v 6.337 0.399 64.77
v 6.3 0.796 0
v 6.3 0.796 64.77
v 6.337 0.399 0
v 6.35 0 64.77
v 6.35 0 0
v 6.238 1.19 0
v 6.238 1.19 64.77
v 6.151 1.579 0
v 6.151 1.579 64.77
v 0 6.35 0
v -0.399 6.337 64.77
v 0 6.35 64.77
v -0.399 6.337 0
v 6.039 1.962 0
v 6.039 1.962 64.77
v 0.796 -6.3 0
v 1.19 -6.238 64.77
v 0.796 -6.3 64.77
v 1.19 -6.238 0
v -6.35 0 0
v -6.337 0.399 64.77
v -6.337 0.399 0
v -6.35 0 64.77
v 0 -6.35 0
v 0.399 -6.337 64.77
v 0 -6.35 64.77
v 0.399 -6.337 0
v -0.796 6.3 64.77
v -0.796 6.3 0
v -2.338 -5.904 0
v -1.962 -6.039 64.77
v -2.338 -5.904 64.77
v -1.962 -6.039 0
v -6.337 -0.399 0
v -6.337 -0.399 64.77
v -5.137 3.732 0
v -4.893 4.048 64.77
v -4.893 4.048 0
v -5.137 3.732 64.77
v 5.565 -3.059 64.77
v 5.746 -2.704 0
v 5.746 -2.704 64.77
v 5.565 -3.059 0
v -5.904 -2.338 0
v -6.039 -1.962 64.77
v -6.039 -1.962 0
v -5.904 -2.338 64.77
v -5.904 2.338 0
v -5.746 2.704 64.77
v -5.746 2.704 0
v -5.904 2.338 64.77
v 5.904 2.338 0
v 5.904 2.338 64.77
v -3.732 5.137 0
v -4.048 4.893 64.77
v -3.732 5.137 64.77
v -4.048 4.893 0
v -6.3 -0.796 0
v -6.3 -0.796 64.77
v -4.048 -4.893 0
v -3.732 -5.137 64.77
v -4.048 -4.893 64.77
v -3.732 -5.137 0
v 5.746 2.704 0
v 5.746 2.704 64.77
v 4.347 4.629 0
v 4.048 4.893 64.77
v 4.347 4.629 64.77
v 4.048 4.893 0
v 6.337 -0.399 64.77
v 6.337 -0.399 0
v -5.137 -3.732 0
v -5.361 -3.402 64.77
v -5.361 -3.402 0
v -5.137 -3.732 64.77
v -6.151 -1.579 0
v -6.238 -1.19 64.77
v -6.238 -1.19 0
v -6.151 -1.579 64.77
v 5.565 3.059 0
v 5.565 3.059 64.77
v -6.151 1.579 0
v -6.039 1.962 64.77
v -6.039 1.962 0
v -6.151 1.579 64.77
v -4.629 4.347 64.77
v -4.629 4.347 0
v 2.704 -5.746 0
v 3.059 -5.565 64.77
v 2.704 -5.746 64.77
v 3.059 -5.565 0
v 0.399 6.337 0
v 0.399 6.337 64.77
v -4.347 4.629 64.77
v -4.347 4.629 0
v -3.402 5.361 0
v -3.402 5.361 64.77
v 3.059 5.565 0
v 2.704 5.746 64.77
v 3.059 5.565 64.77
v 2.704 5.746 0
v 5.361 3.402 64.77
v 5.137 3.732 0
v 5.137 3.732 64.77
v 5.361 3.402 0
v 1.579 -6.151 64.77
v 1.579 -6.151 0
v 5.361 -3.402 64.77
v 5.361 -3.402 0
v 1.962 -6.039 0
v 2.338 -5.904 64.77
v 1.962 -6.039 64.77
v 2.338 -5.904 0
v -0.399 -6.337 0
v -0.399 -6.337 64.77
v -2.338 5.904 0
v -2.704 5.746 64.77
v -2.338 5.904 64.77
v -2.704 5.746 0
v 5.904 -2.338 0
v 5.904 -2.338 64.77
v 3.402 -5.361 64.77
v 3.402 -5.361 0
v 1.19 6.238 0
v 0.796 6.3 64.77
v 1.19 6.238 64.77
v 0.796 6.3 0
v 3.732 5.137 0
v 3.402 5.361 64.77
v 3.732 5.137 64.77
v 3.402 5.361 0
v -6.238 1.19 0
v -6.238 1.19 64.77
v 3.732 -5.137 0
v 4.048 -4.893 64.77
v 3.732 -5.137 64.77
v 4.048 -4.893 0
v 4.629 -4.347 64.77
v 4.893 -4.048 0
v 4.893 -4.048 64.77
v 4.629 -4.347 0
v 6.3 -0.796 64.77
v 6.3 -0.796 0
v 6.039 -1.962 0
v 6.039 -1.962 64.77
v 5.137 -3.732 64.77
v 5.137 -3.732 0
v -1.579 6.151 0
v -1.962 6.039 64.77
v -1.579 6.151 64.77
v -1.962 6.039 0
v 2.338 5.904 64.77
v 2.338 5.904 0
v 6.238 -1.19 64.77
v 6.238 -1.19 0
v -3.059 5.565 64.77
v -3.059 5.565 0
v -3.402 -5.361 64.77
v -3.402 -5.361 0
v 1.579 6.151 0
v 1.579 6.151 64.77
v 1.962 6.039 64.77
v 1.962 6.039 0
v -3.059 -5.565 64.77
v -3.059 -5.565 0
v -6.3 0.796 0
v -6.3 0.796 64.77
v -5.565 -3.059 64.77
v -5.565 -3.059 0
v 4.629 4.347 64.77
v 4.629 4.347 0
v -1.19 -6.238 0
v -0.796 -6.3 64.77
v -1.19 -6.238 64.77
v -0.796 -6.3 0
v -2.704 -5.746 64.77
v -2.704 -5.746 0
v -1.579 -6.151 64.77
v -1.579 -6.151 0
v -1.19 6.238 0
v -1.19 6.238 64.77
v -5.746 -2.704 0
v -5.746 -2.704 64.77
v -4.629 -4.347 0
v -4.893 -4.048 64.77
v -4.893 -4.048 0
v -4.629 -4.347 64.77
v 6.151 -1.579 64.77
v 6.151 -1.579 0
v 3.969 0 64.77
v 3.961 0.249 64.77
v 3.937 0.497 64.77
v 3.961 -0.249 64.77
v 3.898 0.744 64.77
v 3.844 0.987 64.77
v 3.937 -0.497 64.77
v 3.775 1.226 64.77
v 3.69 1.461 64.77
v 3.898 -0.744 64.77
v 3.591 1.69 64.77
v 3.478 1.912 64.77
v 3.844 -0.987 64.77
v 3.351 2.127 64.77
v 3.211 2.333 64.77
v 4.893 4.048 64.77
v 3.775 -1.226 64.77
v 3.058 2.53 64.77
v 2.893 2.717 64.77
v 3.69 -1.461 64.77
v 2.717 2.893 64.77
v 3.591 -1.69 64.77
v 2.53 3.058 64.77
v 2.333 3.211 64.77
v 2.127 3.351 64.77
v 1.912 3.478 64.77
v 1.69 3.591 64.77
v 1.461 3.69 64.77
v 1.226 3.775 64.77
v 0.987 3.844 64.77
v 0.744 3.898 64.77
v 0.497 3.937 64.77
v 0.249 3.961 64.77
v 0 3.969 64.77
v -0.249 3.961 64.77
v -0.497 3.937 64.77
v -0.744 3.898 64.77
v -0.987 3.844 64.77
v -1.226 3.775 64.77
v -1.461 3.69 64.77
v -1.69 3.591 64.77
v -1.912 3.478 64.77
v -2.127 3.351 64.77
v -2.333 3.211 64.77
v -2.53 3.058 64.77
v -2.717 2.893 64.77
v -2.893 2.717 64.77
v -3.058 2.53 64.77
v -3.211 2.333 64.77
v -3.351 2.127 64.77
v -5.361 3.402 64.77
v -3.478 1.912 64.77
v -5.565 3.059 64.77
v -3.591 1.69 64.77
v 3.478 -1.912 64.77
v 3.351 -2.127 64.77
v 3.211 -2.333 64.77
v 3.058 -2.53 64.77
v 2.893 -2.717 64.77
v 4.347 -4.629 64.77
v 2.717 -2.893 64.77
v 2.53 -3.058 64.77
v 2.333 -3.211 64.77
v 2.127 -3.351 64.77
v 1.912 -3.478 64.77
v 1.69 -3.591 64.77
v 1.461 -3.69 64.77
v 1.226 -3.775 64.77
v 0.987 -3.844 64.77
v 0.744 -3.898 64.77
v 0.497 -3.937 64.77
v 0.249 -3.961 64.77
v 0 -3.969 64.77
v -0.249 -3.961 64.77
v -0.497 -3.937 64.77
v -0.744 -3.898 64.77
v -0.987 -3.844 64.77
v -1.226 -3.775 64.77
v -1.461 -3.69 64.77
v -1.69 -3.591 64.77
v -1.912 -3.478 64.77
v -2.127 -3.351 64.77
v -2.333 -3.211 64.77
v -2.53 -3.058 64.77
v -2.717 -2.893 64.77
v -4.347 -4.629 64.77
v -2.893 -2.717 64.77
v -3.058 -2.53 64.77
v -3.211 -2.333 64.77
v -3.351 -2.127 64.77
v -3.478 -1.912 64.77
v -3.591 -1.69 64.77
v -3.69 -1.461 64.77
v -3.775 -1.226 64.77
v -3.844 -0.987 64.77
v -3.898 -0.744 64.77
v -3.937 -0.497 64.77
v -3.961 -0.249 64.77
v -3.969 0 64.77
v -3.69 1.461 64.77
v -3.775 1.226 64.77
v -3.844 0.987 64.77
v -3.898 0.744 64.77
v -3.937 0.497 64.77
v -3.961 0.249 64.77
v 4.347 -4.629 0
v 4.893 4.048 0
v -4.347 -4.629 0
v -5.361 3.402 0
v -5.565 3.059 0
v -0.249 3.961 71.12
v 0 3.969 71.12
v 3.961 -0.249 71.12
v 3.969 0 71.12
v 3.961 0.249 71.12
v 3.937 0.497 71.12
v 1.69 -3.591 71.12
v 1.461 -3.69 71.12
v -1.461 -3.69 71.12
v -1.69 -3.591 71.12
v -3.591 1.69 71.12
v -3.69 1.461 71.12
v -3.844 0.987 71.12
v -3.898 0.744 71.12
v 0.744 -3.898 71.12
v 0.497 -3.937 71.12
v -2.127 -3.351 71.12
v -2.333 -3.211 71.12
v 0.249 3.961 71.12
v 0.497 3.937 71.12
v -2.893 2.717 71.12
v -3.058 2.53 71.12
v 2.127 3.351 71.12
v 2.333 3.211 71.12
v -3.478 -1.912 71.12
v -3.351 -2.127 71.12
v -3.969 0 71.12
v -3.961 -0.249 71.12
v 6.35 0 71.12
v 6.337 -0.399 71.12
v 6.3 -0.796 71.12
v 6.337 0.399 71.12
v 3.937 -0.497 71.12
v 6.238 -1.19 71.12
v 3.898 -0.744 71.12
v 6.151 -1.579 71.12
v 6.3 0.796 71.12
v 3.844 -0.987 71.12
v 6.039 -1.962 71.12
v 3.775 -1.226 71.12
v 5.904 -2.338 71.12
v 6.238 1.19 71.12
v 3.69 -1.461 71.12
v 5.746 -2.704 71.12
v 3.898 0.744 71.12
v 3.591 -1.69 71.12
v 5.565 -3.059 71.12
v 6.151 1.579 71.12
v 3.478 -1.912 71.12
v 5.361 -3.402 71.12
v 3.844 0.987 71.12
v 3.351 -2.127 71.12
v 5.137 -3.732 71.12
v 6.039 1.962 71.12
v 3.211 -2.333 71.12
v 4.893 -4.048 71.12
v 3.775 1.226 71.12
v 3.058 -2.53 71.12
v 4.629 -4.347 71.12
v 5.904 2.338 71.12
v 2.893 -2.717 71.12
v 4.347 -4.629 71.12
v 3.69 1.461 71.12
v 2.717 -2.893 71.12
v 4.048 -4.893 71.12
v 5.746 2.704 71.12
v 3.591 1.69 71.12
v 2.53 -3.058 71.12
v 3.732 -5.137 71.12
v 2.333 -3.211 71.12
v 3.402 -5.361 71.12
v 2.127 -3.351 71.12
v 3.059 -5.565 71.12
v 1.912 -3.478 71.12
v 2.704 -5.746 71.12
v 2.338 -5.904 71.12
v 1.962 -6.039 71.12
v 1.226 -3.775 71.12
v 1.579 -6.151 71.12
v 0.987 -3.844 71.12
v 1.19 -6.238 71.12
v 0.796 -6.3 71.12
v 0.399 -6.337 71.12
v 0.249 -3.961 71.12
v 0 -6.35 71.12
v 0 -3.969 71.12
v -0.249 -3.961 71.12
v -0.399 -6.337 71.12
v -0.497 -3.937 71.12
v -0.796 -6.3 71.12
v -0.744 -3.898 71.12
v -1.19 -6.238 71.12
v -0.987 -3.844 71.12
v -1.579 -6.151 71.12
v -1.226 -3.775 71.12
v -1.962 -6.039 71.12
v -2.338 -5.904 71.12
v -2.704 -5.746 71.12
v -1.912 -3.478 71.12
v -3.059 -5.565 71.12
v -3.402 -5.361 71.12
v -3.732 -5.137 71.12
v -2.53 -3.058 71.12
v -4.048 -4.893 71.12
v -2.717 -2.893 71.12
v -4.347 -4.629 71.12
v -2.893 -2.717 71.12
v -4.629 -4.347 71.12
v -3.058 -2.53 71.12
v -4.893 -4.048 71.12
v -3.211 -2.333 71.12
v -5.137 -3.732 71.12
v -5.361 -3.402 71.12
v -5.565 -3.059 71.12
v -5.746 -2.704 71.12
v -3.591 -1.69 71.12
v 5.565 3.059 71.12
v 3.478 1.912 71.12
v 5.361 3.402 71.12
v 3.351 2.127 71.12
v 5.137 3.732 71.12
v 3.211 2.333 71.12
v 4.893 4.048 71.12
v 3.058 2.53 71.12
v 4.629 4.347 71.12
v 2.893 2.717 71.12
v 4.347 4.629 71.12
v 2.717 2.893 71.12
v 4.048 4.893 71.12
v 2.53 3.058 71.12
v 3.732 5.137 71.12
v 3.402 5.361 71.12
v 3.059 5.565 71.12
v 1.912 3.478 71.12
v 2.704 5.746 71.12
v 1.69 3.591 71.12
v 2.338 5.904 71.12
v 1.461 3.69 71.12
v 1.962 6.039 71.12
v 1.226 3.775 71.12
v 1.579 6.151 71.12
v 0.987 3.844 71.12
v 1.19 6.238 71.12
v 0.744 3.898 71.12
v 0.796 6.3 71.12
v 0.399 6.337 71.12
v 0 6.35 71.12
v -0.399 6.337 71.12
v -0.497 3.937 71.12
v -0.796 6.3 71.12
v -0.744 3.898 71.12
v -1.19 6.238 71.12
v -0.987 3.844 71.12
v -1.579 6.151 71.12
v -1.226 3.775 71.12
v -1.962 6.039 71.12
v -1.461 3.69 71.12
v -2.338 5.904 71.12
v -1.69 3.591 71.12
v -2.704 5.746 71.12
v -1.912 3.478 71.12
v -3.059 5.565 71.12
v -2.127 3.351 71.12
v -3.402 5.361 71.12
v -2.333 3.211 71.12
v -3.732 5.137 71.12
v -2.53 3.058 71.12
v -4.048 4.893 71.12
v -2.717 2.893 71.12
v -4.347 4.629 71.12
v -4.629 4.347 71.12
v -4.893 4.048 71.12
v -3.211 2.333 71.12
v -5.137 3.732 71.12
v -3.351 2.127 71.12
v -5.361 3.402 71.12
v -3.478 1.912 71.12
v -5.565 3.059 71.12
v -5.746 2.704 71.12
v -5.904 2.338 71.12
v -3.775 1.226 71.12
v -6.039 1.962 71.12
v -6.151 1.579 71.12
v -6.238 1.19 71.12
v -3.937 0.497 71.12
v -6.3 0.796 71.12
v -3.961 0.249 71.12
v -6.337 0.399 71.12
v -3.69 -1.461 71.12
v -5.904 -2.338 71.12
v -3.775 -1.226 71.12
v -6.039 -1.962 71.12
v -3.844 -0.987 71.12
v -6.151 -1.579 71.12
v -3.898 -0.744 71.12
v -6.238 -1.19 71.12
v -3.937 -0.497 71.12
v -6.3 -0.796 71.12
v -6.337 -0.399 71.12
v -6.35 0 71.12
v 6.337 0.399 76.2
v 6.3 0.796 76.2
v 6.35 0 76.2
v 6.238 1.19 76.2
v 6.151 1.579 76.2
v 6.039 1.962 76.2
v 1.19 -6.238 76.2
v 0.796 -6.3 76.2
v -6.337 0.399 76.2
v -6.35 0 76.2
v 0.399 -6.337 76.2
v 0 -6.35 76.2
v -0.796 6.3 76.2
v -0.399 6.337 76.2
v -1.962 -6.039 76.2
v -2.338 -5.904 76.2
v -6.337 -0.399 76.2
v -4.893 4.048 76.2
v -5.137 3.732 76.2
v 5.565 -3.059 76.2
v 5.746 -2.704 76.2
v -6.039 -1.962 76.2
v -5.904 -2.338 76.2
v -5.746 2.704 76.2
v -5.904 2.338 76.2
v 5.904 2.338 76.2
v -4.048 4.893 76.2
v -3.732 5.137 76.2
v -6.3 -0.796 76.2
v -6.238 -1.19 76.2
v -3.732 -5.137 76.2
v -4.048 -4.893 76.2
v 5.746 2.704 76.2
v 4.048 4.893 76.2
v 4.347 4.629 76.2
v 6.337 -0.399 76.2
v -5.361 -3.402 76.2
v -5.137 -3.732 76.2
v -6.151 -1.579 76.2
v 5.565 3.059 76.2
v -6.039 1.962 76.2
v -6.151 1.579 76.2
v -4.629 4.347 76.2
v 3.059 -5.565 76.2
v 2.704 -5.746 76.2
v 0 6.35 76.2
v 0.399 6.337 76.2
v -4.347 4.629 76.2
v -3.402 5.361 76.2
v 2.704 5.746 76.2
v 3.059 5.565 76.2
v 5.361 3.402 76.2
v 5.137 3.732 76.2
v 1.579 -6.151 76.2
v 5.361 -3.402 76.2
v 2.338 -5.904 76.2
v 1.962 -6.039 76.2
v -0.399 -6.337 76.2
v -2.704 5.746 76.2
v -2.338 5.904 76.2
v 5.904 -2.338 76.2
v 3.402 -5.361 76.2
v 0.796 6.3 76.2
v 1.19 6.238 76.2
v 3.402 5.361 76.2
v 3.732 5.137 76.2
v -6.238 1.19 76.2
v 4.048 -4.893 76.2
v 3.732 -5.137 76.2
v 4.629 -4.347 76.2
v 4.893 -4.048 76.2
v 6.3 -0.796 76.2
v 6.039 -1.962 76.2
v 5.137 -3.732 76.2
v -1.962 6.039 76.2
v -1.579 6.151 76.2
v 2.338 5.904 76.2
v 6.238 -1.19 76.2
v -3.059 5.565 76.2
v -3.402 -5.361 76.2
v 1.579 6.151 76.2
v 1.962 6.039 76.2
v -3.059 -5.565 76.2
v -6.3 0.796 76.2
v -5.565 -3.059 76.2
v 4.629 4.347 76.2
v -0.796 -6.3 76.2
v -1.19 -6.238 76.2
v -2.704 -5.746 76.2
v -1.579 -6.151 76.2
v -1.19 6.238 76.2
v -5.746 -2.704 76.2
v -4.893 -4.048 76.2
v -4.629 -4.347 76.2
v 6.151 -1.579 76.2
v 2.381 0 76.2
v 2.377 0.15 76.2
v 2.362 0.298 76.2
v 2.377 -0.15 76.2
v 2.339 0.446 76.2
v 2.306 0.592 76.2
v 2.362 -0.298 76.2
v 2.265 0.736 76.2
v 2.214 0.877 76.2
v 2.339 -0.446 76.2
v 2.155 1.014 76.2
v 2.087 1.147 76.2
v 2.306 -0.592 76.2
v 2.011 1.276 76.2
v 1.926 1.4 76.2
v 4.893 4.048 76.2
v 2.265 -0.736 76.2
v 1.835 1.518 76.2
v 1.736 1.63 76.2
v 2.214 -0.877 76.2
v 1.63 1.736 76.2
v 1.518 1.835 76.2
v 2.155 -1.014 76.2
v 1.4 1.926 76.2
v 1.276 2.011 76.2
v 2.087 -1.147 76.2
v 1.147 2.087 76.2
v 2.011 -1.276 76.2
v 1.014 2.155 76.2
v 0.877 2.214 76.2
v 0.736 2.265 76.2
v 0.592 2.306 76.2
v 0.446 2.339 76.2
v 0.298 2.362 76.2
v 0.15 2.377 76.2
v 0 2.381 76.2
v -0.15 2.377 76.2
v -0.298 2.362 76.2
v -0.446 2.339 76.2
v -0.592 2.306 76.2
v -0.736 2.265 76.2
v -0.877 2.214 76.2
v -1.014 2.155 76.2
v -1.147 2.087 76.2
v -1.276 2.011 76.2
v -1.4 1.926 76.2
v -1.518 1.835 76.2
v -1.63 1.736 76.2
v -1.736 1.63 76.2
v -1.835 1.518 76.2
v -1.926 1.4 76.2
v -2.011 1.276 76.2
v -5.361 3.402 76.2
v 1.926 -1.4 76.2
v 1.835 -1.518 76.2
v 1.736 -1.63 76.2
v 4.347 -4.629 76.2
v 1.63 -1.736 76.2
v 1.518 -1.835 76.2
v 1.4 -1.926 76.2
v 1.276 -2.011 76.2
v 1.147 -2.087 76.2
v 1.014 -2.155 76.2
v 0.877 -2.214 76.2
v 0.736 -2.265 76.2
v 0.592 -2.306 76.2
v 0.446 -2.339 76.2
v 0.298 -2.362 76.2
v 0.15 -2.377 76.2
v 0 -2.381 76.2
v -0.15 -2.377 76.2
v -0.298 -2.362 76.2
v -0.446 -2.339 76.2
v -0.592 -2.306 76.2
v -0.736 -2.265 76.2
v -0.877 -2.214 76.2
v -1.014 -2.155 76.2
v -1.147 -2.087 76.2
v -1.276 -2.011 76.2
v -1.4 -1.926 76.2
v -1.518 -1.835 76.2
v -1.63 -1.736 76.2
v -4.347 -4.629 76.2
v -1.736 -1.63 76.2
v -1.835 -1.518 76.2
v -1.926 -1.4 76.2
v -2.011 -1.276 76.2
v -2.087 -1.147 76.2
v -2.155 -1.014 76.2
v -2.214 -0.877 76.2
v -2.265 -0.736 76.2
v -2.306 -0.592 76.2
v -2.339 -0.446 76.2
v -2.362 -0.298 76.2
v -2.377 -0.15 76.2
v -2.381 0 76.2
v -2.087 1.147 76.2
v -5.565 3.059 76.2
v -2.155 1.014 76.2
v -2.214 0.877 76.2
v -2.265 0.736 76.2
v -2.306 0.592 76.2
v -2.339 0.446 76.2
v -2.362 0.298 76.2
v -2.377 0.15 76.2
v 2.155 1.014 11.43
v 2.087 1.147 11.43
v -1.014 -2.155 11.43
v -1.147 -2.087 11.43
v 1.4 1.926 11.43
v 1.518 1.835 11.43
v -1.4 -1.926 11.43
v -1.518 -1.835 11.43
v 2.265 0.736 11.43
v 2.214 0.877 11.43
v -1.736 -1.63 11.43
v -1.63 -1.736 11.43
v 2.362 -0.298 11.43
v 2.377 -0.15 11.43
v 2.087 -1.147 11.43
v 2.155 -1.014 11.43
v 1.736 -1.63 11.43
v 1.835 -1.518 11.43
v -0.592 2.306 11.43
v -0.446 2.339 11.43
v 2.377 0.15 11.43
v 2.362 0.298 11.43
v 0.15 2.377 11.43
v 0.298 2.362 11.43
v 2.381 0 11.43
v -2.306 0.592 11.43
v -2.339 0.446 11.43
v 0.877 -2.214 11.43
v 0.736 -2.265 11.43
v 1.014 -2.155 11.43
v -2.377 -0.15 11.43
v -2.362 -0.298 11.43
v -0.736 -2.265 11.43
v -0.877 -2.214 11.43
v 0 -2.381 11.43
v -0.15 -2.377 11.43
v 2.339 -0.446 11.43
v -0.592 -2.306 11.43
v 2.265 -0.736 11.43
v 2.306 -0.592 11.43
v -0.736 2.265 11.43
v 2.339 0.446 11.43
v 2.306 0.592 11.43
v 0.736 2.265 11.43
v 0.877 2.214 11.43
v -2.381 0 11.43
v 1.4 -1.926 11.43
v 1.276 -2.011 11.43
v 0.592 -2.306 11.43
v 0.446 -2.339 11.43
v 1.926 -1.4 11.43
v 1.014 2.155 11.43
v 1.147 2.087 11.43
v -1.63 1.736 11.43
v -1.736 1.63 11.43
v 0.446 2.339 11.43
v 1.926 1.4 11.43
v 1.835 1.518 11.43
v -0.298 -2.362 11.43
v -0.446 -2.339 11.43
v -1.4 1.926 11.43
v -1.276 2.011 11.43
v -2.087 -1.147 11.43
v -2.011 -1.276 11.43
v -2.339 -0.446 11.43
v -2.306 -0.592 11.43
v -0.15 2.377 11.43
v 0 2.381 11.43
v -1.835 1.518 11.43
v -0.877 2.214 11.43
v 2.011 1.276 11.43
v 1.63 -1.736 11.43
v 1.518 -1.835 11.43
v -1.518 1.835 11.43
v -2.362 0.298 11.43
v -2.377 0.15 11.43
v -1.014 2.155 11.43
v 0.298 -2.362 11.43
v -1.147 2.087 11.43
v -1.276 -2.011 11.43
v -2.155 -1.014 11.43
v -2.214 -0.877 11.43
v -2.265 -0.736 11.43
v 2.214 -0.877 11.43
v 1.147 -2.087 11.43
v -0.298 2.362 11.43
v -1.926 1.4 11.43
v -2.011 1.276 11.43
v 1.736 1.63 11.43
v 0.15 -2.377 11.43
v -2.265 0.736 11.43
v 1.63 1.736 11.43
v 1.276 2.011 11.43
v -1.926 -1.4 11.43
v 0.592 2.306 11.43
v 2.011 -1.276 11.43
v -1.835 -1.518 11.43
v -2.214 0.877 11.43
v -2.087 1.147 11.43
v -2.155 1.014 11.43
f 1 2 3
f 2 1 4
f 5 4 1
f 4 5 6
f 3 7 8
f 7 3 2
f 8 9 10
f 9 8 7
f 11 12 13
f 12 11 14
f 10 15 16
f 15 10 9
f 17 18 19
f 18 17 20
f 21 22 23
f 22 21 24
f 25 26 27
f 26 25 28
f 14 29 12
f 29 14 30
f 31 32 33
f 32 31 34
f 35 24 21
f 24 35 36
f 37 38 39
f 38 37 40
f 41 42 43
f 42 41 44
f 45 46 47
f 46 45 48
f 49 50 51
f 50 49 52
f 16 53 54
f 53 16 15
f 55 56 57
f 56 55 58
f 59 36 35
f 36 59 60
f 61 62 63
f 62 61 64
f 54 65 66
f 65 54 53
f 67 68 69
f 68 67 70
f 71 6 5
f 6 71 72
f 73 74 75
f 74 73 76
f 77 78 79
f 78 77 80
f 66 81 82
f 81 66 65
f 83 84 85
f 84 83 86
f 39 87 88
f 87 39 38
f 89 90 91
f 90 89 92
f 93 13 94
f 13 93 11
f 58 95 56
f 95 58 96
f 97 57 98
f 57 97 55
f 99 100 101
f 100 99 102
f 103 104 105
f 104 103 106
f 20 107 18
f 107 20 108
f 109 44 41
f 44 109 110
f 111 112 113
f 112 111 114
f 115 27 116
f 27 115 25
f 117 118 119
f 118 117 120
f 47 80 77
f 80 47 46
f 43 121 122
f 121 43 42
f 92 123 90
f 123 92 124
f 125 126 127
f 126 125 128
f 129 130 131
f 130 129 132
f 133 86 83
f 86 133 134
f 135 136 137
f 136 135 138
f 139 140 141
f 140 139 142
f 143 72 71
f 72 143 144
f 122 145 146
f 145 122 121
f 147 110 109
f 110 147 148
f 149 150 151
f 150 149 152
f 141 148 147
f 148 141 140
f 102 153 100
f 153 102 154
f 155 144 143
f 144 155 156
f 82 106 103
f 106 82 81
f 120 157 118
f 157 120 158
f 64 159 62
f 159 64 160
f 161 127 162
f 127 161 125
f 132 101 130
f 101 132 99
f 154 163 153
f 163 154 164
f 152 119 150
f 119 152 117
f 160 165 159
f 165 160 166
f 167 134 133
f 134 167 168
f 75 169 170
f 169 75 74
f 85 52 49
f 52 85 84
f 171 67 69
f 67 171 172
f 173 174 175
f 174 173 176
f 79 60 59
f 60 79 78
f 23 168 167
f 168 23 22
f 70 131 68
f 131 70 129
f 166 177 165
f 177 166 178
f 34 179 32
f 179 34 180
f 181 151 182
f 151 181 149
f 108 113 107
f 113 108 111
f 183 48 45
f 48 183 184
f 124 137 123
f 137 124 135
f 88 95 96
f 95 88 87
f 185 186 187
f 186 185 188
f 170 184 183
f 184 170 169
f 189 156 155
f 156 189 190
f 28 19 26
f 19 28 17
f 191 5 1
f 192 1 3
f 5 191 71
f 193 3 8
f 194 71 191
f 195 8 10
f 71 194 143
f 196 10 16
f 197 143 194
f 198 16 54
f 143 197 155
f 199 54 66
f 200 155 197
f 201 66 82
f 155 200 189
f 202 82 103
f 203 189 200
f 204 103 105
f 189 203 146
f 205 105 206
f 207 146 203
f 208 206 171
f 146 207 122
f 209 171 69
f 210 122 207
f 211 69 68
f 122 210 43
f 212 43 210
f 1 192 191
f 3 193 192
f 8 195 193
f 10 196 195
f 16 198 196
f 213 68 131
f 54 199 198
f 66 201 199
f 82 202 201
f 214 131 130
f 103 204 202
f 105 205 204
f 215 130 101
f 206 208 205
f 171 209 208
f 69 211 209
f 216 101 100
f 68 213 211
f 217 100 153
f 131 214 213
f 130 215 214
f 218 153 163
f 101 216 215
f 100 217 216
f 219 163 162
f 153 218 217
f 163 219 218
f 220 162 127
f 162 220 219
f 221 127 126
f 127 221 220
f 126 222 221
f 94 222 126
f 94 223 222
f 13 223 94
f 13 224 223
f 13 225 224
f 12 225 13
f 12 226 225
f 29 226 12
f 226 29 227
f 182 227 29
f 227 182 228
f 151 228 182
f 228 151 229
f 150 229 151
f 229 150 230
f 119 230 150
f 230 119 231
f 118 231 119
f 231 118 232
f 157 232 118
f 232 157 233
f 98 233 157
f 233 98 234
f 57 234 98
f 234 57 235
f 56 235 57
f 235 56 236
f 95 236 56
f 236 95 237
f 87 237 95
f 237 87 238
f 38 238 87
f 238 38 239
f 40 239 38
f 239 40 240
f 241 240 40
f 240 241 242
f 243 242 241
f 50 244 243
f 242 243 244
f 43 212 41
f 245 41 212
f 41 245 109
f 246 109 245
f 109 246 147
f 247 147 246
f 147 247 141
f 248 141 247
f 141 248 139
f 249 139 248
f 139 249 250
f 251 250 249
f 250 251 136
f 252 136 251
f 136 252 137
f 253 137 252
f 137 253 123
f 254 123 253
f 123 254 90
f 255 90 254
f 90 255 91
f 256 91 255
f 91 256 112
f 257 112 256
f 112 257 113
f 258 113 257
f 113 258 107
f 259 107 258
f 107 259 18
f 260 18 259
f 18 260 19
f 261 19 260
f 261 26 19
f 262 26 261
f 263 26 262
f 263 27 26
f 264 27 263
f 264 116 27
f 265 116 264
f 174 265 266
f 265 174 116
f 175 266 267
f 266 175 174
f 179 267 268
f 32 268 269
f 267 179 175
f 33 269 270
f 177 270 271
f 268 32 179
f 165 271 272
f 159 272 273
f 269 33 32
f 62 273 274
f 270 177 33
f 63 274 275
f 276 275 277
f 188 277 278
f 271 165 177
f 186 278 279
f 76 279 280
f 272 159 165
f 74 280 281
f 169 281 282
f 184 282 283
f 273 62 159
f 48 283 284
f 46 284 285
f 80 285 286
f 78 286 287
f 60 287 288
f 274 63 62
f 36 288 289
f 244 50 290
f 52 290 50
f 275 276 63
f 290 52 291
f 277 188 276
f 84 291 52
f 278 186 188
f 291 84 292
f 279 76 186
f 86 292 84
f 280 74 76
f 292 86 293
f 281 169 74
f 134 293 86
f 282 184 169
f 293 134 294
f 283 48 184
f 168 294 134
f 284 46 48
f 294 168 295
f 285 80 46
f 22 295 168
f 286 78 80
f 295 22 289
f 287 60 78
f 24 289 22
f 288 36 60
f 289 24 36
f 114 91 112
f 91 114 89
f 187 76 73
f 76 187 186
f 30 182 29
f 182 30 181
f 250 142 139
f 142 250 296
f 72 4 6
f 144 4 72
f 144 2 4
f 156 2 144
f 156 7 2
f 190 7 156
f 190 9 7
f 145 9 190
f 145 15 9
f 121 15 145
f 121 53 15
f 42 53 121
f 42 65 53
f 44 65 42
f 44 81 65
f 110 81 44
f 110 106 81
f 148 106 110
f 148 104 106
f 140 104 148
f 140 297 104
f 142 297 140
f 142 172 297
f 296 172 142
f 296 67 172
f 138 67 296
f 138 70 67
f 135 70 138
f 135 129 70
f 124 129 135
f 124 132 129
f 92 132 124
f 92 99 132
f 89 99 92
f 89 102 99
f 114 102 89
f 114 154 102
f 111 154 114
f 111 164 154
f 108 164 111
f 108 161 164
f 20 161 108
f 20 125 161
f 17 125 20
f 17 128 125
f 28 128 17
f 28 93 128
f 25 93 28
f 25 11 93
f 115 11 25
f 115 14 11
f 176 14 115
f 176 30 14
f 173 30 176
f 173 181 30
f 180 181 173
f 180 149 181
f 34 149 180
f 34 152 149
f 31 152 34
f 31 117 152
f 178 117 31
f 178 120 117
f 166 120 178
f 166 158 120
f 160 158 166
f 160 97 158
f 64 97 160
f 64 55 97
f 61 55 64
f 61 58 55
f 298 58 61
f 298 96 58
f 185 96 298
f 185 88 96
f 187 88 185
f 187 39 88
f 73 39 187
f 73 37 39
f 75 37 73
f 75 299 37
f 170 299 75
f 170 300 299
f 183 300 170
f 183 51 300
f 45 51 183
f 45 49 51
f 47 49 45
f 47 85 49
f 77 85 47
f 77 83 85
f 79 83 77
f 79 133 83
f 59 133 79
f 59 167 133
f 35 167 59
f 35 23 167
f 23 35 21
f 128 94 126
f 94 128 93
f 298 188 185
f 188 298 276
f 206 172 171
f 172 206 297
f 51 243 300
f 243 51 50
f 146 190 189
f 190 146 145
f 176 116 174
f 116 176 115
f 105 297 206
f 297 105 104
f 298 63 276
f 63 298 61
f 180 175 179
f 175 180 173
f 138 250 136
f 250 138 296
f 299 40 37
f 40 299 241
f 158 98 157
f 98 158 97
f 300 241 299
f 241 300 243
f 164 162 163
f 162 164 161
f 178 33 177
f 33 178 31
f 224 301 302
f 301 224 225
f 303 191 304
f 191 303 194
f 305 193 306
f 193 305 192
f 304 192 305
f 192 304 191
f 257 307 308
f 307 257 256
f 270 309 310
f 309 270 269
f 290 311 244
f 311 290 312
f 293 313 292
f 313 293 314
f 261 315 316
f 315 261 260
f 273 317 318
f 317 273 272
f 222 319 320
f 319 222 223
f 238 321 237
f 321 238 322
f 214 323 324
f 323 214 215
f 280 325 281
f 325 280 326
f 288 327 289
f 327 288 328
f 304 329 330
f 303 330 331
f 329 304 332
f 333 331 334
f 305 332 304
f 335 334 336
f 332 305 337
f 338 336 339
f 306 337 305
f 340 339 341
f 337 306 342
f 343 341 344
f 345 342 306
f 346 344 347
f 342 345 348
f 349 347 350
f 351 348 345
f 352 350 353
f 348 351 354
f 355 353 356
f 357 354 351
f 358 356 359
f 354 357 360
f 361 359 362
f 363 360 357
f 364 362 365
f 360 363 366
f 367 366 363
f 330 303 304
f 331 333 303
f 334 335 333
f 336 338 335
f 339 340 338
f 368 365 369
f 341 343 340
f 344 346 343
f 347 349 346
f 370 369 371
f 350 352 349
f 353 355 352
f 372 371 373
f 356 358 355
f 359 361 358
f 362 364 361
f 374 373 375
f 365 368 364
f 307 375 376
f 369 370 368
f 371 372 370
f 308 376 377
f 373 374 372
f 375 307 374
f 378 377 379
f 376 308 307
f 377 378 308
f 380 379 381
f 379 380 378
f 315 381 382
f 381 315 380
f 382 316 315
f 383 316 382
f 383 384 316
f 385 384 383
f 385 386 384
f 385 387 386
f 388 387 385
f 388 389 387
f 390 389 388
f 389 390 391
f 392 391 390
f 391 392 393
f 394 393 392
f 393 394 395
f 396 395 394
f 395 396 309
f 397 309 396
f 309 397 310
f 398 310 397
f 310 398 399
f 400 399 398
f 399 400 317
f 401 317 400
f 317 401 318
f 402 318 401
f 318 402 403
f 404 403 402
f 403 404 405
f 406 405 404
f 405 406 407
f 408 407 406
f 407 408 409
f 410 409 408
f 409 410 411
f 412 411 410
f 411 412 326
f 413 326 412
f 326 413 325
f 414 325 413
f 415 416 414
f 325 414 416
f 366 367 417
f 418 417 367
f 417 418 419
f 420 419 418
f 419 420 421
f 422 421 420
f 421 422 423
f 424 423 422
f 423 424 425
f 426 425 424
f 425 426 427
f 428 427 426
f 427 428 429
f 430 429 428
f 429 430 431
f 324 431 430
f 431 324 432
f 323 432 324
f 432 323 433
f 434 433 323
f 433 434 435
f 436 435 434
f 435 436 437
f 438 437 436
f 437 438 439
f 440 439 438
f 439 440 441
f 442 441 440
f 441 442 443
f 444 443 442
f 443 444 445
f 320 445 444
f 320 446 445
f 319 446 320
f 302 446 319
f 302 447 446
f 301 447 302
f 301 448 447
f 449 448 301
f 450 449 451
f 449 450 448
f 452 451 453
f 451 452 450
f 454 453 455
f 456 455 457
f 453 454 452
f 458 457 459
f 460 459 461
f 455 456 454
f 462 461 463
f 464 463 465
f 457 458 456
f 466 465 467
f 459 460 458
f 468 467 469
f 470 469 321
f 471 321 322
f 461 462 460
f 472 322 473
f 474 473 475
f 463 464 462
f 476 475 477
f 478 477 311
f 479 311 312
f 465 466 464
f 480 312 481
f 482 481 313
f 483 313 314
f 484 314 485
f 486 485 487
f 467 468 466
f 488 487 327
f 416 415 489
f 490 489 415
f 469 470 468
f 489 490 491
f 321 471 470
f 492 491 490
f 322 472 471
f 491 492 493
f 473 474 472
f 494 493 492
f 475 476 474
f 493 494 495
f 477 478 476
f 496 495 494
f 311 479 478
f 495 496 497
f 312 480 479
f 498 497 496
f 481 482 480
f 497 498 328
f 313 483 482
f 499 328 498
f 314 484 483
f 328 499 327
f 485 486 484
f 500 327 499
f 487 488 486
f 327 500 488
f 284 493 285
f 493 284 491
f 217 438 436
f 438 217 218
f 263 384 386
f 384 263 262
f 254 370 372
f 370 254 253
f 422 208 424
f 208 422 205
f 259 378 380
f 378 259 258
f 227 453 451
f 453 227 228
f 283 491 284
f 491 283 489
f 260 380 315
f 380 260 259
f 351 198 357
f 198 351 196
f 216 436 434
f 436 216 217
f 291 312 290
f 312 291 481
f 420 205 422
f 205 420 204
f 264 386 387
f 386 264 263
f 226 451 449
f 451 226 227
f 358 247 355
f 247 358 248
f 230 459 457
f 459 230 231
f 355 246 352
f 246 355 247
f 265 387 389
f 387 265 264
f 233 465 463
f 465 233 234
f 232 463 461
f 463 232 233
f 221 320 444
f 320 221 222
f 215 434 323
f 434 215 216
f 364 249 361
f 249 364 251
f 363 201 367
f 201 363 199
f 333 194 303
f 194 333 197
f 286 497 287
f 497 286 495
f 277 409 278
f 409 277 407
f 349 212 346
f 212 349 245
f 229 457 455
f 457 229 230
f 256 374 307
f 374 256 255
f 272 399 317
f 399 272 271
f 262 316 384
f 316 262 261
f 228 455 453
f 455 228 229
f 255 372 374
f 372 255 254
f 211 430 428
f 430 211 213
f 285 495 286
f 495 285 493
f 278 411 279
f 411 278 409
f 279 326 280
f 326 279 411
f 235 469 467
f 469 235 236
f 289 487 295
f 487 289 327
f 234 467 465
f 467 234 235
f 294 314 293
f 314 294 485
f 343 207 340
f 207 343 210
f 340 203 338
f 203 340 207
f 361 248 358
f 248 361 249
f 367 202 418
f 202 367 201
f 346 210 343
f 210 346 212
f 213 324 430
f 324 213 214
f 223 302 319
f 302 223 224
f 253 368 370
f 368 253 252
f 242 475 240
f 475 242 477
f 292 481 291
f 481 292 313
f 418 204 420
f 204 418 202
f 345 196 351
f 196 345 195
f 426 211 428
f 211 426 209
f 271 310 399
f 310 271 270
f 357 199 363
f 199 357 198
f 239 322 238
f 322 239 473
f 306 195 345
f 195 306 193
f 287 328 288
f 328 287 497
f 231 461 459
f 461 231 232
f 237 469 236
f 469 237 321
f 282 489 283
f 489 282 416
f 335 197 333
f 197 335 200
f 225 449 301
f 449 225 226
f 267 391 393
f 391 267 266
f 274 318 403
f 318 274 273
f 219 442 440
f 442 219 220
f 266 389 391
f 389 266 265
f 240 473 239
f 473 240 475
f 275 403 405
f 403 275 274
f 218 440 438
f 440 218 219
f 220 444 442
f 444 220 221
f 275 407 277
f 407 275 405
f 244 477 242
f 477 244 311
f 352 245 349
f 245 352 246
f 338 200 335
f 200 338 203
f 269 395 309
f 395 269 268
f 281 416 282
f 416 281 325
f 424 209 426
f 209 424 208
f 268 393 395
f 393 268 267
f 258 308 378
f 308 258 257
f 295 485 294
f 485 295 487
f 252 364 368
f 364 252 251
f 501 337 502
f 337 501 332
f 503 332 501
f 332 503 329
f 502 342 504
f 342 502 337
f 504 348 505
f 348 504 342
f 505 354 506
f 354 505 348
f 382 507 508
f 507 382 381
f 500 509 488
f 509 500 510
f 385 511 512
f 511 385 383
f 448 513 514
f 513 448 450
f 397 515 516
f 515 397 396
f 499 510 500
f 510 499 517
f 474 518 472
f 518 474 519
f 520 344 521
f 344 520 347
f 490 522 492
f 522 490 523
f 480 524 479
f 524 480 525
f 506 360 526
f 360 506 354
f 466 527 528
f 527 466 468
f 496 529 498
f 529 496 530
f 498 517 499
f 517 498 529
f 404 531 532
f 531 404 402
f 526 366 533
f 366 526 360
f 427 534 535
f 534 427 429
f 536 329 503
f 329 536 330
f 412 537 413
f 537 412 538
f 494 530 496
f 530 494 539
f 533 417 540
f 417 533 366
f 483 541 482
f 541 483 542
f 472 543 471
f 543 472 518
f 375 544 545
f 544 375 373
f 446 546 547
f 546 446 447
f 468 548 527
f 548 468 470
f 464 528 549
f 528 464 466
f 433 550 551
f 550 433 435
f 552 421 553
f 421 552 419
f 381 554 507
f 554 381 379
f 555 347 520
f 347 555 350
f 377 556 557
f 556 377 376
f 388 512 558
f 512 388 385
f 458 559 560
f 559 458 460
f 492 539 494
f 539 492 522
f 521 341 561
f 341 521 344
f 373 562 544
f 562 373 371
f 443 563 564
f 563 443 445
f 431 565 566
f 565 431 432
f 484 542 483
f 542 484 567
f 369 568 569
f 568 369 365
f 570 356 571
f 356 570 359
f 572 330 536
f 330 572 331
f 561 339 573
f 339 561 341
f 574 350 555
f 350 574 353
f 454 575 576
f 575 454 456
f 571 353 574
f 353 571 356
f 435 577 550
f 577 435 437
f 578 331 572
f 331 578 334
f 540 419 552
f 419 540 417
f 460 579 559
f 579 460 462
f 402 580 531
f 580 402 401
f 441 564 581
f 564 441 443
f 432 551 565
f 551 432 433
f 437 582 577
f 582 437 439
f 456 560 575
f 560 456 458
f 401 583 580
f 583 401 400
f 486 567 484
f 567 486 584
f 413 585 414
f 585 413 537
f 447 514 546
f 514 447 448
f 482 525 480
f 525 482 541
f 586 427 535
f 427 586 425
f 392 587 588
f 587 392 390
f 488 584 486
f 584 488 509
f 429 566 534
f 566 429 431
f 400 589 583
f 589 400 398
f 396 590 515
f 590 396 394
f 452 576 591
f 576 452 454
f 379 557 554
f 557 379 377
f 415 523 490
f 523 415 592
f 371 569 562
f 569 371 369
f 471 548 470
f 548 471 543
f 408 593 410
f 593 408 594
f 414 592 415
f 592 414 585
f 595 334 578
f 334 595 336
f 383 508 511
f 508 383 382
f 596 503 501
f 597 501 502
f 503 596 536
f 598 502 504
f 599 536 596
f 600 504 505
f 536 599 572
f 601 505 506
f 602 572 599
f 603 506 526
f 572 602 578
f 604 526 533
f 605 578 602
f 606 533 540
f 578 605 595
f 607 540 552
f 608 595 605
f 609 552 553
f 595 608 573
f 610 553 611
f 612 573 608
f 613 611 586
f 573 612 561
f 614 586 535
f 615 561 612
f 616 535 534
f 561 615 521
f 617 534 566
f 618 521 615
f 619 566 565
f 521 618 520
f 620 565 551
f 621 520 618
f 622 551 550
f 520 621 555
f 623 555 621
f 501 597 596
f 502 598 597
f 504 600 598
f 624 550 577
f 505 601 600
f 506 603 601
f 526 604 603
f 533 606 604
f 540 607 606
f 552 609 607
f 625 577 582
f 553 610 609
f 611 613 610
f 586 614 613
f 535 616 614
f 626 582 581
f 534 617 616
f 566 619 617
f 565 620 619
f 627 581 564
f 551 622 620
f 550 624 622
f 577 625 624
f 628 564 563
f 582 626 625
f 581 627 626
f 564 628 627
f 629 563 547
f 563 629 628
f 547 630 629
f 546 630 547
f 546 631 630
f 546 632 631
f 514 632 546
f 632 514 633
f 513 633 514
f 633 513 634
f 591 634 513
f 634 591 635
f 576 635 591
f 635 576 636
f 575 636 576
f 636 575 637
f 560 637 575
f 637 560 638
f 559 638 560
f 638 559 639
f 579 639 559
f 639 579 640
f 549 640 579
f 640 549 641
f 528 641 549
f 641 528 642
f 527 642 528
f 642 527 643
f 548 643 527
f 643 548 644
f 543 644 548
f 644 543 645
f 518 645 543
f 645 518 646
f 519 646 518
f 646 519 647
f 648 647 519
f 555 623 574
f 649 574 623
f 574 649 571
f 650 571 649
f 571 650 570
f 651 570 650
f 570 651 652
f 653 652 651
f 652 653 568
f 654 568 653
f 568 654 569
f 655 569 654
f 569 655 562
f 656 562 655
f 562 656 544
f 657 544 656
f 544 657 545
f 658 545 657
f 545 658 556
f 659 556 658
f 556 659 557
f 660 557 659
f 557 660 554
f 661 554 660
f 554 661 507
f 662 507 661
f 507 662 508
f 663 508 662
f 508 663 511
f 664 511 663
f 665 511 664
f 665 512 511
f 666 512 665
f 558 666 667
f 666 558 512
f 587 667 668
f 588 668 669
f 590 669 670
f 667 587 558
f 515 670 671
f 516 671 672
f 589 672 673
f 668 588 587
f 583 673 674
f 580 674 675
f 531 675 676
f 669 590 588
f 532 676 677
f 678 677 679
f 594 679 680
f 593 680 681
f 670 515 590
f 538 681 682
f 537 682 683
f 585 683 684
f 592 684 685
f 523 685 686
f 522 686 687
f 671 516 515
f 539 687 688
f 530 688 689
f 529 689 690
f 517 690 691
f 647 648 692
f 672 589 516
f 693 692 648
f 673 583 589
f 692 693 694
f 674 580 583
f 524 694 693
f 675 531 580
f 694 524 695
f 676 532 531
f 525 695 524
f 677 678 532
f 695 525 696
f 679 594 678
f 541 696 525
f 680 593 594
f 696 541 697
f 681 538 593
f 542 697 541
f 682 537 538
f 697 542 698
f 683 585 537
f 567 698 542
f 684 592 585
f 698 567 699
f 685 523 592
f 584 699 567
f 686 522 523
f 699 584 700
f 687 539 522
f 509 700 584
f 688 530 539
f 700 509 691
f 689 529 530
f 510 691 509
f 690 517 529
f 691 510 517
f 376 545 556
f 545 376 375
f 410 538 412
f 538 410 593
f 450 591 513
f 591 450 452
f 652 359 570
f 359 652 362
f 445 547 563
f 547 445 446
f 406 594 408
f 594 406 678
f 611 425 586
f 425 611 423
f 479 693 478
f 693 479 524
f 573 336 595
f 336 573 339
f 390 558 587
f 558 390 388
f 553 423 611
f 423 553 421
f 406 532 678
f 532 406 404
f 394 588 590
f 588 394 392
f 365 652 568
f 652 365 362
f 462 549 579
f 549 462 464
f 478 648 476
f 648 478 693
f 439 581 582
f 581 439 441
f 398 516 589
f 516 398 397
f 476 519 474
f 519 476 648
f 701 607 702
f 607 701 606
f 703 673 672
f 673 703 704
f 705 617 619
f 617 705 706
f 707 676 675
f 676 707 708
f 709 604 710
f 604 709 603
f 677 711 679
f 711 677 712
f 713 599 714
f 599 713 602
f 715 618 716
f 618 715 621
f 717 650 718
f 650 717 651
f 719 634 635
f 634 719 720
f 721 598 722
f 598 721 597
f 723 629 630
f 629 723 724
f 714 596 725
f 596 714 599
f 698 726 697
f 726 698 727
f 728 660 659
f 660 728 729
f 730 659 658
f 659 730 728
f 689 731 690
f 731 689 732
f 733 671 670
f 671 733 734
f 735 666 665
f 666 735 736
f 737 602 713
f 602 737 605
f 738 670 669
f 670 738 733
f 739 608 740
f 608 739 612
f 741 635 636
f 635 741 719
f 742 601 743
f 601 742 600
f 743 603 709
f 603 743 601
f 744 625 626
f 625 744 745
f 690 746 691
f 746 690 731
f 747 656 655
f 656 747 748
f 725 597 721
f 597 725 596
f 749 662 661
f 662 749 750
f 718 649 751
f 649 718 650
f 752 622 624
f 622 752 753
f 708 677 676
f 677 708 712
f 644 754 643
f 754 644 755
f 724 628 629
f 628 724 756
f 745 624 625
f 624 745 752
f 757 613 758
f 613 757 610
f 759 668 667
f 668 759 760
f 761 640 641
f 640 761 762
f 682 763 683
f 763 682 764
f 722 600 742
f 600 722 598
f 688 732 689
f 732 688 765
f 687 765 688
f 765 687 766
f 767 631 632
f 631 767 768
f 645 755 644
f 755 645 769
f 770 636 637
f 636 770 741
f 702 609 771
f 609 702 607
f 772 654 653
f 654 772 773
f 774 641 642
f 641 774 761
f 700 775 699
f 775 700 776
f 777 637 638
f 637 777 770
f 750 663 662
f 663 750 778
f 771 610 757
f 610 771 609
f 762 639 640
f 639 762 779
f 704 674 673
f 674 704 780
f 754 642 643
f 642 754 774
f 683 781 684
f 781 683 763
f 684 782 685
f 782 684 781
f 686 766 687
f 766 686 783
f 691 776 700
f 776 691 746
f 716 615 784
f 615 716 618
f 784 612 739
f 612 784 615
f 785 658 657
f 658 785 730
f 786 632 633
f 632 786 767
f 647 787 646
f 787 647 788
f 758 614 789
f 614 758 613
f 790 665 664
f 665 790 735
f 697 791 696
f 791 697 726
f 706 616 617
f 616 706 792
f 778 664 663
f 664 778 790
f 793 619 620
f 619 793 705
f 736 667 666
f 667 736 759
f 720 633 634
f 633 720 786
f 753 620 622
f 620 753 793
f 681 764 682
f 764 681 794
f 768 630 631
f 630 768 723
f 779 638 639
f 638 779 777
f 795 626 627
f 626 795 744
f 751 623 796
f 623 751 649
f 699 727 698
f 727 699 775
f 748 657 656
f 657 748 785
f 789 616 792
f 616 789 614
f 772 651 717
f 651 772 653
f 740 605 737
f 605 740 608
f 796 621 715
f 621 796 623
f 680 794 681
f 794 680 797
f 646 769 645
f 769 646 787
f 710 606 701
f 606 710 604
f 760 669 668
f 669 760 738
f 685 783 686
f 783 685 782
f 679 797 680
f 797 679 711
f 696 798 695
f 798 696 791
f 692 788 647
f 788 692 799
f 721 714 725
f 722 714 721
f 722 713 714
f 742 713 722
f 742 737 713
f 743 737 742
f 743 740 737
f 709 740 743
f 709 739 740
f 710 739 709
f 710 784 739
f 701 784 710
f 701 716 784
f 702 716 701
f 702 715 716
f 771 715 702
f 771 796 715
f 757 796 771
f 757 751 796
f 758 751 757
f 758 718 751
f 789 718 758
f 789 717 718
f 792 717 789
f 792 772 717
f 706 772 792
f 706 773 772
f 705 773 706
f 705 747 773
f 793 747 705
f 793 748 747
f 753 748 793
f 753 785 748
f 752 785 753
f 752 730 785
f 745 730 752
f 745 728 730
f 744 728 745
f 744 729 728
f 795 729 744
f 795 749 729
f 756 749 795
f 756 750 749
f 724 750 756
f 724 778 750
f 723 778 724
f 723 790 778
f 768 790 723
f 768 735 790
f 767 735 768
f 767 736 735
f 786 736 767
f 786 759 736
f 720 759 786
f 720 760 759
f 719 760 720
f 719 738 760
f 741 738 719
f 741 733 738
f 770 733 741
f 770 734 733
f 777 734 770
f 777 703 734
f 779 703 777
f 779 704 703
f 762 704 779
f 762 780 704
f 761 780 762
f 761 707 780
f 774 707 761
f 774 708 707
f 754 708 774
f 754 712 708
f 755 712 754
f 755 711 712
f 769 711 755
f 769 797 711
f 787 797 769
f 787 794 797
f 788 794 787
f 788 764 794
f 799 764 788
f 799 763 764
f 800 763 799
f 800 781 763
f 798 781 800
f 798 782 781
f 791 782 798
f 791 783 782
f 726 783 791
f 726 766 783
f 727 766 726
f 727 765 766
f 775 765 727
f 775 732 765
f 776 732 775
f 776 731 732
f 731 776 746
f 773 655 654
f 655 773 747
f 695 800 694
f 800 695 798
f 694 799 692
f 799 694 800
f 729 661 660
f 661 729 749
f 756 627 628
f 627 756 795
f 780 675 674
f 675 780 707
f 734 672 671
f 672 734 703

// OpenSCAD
OR = 25.4*1/4;				//Outer Diameter
IR = 25.4*3/32;			//Hole Diameter
OL = 25.4*3;				//Overall Length
TL = 25.4*.25;				//Throat Length
TR = 25.4*5/32;			//Throat Diameter
LL = 25.4*.2;				//Lip Length

difference() {
	union() {
		cylinder(r=OR, h=OL-TL-LL, $fn=100);
		translate([0,0,OL-TL-LL]) cylinder(r=TR, h=TL, $fn=100);
		translate([0,0,OL-LL]) cylinder(r=OR, h=LL, $fn=100);
	}
	translate([0,0,LL+TL]) cylinder(r=IR, h=OL-TL, $fn=100);
}
